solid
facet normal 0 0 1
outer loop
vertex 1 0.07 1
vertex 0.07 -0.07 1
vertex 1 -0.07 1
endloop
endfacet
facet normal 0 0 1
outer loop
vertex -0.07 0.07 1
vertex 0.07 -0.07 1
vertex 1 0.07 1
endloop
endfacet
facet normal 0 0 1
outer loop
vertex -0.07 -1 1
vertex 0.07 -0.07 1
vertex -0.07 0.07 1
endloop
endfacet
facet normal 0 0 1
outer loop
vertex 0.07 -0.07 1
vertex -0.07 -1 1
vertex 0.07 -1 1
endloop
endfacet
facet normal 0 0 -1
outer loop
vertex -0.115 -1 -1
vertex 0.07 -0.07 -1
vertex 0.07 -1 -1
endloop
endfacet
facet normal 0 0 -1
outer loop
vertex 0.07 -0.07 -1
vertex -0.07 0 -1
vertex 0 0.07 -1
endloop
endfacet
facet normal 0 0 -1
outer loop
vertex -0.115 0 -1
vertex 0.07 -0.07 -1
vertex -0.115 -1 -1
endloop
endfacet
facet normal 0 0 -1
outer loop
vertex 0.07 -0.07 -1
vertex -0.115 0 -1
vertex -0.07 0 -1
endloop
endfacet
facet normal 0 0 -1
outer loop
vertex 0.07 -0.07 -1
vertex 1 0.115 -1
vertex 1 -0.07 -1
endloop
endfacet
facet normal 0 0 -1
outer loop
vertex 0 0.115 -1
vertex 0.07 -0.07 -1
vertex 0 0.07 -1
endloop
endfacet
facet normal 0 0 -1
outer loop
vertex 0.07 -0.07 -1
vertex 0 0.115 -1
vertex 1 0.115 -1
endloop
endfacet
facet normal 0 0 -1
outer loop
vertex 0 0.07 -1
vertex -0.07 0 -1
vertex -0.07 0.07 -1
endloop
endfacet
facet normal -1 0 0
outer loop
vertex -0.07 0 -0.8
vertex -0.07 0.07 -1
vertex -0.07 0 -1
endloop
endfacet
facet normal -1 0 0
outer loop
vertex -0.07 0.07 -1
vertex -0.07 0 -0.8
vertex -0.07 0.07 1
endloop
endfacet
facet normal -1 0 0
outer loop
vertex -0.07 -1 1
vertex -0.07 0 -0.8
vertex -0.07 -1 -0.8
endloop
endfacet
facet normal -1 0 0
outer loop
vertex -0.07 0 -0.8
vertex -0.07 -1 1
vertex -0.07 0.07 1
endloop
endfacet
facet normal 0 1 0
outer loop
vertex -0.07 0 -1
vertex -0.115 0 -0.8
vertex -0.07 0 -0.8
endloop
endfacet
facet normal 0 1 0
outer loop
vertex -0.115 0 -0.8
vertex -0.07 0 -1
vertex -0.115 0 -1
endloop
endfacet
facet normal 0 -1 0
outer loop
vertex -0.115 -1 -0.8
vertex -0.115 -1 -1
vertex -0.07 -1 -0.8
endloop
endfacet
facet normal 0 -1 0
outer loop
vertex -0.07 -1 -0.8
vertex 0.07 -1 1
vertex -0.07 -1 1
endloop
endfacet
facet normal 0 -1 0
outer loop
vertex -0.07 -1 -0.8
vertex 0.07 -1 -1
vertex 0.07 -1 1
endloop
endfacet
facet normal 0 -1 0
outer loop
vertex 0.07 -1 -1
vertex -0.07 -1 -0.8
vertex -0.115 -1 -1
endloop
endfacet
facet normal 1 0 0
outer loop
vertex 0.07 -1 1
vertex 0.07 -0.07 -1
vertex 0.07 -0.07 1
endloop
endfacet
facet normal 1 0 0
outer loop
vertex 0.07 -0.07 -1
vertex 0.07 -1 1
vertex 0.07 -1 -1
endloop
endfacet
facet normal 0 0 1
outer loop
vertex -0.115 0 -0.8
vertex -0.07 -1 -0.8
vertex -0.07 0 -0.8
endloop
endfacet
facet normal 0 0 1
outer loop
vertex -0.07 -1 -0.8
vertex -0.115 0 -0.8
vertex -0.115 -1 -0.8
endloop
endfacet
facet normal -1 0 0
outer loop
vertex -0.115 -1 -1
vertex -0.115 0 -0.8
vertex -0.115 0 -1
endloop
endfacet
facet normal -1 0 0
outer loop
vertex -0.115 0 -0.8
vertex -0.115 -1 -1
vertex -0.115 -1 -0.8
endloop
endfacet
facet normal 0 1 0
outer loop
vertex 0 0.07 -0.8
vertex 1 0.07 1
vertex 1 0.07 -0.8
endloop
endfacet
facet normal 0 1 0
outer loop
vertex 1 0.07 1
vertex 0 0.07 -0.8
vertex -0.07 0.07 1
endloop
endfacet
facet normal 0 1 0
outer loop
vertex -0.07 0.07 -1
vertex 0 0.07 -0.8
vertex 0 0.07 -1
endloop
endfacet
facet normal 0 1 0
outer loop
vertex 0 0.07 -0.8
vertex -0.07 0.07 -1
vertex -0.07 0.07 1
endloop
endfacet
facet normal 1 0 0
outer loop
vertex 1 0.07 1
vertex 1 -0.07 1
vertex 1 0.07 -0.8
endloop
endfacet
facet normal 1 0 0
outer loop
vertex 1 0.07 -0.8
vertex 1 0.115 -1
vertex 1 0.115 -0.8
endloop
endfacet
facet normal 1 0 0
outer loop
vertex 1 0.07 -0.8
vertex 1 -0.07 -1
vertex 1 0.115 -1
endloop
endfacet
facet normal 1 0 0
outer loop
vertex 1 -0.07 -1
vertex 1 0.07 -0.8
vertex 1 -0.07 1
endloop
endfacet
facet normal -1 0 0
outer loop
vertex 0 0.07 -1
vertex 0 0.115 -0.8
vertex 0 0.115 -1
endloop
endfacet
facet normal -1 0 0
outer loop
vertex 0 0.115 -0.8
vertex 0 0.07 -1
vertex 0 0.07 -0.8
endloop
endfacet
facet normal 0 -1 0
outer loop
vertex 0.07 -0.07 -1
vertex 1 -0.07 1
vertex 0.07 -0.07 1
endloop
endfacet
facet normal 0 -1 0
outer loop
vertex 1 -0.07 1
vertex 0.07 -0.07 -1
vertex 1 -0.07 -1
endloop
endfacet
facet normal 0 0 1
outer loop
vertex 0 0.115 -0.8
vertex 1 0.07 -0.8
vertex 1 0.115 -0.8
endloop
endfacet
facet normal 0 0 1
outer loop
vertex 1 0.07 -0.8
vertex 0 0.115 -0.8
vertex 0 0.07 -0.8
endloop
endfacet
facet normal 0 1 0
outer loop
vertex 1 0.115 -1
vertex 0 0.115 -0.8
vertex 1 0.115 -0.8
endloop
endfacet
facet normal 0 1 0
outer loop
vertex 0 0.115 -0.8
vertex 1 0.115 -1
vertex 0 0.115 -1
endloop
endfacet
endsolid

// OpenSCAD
module Wall_04(rot = 0){


module Wall_01(){
    translate([-0.06,0,0])
    color("white")
    cube([0.02,1,2], center= true);
    
    color("#295f48")
    translate([0.06,0,0])
    color("white")
    cube([0.02,1,2], center= true);
    
    
    color("#b2b2b2")
    cube([0.1,1,2], center= true);
    
    translate([-0.09,0,-0.9])    
    color("gray")
    cube([0.05,1,0.2], center= true);

}

rotate([0,0,rot * 90]){
union(){
translate([0,-0.5,0])
Wall_01();

translate([0.5,0,0])
rotate([0,0,-90])
Wall_01();

}

color("white")
translate([-0.035,0.035,0])
rotate([0,0,0])
cube([0.07,0.07,2], center= true);

}
}

Wall_04(rot = 0);

// Written by Nicolì Angelo (Gengio) 2024: 
// MIT License

//Permission is hereby granted, free of charge, to any person obtaining a copy of this software and associated documentation files (the "Software"), to deal in the Software without restriction, including without limitation the rights to use, copy, modify, merge, publish, distribute, sublicense, and/or sell copies of the Software, and to permit persons to whom the Software is furnished to do so, subject to the following conditions:

//The above copyright notice and this permission notice shall be included in all copies or substantial portions of the Software.

//THE SOFTWARE IS PROVIDED "AS IS", WITHOUT WARRANTY OF ANY KIND, EXPRESS OR IMPLIED, INCLUDING BUT NOT LIMITED TO THE WARRANTIES OF MERCHANTABILITY, FITNESS FOR A PARTICULAR PURPOSE AND NONINFRINGEMENT. IN NO EVENT SHALL THE AUTHORS OR COPYRIGHT HOLDERS BE LIABLE FOR ANY CLAIM, DAMAGES OR OTHER LIABILITY, WHETHER IN AN ACTION OF CONTRACT, TORT OR OTHERWISE, ARISING FROM, OUT OF OR IN CONNECTION WITH THE SOFTWARE OR THE USE OR OTHER DEALINGS IN THE SOFTWARE.
